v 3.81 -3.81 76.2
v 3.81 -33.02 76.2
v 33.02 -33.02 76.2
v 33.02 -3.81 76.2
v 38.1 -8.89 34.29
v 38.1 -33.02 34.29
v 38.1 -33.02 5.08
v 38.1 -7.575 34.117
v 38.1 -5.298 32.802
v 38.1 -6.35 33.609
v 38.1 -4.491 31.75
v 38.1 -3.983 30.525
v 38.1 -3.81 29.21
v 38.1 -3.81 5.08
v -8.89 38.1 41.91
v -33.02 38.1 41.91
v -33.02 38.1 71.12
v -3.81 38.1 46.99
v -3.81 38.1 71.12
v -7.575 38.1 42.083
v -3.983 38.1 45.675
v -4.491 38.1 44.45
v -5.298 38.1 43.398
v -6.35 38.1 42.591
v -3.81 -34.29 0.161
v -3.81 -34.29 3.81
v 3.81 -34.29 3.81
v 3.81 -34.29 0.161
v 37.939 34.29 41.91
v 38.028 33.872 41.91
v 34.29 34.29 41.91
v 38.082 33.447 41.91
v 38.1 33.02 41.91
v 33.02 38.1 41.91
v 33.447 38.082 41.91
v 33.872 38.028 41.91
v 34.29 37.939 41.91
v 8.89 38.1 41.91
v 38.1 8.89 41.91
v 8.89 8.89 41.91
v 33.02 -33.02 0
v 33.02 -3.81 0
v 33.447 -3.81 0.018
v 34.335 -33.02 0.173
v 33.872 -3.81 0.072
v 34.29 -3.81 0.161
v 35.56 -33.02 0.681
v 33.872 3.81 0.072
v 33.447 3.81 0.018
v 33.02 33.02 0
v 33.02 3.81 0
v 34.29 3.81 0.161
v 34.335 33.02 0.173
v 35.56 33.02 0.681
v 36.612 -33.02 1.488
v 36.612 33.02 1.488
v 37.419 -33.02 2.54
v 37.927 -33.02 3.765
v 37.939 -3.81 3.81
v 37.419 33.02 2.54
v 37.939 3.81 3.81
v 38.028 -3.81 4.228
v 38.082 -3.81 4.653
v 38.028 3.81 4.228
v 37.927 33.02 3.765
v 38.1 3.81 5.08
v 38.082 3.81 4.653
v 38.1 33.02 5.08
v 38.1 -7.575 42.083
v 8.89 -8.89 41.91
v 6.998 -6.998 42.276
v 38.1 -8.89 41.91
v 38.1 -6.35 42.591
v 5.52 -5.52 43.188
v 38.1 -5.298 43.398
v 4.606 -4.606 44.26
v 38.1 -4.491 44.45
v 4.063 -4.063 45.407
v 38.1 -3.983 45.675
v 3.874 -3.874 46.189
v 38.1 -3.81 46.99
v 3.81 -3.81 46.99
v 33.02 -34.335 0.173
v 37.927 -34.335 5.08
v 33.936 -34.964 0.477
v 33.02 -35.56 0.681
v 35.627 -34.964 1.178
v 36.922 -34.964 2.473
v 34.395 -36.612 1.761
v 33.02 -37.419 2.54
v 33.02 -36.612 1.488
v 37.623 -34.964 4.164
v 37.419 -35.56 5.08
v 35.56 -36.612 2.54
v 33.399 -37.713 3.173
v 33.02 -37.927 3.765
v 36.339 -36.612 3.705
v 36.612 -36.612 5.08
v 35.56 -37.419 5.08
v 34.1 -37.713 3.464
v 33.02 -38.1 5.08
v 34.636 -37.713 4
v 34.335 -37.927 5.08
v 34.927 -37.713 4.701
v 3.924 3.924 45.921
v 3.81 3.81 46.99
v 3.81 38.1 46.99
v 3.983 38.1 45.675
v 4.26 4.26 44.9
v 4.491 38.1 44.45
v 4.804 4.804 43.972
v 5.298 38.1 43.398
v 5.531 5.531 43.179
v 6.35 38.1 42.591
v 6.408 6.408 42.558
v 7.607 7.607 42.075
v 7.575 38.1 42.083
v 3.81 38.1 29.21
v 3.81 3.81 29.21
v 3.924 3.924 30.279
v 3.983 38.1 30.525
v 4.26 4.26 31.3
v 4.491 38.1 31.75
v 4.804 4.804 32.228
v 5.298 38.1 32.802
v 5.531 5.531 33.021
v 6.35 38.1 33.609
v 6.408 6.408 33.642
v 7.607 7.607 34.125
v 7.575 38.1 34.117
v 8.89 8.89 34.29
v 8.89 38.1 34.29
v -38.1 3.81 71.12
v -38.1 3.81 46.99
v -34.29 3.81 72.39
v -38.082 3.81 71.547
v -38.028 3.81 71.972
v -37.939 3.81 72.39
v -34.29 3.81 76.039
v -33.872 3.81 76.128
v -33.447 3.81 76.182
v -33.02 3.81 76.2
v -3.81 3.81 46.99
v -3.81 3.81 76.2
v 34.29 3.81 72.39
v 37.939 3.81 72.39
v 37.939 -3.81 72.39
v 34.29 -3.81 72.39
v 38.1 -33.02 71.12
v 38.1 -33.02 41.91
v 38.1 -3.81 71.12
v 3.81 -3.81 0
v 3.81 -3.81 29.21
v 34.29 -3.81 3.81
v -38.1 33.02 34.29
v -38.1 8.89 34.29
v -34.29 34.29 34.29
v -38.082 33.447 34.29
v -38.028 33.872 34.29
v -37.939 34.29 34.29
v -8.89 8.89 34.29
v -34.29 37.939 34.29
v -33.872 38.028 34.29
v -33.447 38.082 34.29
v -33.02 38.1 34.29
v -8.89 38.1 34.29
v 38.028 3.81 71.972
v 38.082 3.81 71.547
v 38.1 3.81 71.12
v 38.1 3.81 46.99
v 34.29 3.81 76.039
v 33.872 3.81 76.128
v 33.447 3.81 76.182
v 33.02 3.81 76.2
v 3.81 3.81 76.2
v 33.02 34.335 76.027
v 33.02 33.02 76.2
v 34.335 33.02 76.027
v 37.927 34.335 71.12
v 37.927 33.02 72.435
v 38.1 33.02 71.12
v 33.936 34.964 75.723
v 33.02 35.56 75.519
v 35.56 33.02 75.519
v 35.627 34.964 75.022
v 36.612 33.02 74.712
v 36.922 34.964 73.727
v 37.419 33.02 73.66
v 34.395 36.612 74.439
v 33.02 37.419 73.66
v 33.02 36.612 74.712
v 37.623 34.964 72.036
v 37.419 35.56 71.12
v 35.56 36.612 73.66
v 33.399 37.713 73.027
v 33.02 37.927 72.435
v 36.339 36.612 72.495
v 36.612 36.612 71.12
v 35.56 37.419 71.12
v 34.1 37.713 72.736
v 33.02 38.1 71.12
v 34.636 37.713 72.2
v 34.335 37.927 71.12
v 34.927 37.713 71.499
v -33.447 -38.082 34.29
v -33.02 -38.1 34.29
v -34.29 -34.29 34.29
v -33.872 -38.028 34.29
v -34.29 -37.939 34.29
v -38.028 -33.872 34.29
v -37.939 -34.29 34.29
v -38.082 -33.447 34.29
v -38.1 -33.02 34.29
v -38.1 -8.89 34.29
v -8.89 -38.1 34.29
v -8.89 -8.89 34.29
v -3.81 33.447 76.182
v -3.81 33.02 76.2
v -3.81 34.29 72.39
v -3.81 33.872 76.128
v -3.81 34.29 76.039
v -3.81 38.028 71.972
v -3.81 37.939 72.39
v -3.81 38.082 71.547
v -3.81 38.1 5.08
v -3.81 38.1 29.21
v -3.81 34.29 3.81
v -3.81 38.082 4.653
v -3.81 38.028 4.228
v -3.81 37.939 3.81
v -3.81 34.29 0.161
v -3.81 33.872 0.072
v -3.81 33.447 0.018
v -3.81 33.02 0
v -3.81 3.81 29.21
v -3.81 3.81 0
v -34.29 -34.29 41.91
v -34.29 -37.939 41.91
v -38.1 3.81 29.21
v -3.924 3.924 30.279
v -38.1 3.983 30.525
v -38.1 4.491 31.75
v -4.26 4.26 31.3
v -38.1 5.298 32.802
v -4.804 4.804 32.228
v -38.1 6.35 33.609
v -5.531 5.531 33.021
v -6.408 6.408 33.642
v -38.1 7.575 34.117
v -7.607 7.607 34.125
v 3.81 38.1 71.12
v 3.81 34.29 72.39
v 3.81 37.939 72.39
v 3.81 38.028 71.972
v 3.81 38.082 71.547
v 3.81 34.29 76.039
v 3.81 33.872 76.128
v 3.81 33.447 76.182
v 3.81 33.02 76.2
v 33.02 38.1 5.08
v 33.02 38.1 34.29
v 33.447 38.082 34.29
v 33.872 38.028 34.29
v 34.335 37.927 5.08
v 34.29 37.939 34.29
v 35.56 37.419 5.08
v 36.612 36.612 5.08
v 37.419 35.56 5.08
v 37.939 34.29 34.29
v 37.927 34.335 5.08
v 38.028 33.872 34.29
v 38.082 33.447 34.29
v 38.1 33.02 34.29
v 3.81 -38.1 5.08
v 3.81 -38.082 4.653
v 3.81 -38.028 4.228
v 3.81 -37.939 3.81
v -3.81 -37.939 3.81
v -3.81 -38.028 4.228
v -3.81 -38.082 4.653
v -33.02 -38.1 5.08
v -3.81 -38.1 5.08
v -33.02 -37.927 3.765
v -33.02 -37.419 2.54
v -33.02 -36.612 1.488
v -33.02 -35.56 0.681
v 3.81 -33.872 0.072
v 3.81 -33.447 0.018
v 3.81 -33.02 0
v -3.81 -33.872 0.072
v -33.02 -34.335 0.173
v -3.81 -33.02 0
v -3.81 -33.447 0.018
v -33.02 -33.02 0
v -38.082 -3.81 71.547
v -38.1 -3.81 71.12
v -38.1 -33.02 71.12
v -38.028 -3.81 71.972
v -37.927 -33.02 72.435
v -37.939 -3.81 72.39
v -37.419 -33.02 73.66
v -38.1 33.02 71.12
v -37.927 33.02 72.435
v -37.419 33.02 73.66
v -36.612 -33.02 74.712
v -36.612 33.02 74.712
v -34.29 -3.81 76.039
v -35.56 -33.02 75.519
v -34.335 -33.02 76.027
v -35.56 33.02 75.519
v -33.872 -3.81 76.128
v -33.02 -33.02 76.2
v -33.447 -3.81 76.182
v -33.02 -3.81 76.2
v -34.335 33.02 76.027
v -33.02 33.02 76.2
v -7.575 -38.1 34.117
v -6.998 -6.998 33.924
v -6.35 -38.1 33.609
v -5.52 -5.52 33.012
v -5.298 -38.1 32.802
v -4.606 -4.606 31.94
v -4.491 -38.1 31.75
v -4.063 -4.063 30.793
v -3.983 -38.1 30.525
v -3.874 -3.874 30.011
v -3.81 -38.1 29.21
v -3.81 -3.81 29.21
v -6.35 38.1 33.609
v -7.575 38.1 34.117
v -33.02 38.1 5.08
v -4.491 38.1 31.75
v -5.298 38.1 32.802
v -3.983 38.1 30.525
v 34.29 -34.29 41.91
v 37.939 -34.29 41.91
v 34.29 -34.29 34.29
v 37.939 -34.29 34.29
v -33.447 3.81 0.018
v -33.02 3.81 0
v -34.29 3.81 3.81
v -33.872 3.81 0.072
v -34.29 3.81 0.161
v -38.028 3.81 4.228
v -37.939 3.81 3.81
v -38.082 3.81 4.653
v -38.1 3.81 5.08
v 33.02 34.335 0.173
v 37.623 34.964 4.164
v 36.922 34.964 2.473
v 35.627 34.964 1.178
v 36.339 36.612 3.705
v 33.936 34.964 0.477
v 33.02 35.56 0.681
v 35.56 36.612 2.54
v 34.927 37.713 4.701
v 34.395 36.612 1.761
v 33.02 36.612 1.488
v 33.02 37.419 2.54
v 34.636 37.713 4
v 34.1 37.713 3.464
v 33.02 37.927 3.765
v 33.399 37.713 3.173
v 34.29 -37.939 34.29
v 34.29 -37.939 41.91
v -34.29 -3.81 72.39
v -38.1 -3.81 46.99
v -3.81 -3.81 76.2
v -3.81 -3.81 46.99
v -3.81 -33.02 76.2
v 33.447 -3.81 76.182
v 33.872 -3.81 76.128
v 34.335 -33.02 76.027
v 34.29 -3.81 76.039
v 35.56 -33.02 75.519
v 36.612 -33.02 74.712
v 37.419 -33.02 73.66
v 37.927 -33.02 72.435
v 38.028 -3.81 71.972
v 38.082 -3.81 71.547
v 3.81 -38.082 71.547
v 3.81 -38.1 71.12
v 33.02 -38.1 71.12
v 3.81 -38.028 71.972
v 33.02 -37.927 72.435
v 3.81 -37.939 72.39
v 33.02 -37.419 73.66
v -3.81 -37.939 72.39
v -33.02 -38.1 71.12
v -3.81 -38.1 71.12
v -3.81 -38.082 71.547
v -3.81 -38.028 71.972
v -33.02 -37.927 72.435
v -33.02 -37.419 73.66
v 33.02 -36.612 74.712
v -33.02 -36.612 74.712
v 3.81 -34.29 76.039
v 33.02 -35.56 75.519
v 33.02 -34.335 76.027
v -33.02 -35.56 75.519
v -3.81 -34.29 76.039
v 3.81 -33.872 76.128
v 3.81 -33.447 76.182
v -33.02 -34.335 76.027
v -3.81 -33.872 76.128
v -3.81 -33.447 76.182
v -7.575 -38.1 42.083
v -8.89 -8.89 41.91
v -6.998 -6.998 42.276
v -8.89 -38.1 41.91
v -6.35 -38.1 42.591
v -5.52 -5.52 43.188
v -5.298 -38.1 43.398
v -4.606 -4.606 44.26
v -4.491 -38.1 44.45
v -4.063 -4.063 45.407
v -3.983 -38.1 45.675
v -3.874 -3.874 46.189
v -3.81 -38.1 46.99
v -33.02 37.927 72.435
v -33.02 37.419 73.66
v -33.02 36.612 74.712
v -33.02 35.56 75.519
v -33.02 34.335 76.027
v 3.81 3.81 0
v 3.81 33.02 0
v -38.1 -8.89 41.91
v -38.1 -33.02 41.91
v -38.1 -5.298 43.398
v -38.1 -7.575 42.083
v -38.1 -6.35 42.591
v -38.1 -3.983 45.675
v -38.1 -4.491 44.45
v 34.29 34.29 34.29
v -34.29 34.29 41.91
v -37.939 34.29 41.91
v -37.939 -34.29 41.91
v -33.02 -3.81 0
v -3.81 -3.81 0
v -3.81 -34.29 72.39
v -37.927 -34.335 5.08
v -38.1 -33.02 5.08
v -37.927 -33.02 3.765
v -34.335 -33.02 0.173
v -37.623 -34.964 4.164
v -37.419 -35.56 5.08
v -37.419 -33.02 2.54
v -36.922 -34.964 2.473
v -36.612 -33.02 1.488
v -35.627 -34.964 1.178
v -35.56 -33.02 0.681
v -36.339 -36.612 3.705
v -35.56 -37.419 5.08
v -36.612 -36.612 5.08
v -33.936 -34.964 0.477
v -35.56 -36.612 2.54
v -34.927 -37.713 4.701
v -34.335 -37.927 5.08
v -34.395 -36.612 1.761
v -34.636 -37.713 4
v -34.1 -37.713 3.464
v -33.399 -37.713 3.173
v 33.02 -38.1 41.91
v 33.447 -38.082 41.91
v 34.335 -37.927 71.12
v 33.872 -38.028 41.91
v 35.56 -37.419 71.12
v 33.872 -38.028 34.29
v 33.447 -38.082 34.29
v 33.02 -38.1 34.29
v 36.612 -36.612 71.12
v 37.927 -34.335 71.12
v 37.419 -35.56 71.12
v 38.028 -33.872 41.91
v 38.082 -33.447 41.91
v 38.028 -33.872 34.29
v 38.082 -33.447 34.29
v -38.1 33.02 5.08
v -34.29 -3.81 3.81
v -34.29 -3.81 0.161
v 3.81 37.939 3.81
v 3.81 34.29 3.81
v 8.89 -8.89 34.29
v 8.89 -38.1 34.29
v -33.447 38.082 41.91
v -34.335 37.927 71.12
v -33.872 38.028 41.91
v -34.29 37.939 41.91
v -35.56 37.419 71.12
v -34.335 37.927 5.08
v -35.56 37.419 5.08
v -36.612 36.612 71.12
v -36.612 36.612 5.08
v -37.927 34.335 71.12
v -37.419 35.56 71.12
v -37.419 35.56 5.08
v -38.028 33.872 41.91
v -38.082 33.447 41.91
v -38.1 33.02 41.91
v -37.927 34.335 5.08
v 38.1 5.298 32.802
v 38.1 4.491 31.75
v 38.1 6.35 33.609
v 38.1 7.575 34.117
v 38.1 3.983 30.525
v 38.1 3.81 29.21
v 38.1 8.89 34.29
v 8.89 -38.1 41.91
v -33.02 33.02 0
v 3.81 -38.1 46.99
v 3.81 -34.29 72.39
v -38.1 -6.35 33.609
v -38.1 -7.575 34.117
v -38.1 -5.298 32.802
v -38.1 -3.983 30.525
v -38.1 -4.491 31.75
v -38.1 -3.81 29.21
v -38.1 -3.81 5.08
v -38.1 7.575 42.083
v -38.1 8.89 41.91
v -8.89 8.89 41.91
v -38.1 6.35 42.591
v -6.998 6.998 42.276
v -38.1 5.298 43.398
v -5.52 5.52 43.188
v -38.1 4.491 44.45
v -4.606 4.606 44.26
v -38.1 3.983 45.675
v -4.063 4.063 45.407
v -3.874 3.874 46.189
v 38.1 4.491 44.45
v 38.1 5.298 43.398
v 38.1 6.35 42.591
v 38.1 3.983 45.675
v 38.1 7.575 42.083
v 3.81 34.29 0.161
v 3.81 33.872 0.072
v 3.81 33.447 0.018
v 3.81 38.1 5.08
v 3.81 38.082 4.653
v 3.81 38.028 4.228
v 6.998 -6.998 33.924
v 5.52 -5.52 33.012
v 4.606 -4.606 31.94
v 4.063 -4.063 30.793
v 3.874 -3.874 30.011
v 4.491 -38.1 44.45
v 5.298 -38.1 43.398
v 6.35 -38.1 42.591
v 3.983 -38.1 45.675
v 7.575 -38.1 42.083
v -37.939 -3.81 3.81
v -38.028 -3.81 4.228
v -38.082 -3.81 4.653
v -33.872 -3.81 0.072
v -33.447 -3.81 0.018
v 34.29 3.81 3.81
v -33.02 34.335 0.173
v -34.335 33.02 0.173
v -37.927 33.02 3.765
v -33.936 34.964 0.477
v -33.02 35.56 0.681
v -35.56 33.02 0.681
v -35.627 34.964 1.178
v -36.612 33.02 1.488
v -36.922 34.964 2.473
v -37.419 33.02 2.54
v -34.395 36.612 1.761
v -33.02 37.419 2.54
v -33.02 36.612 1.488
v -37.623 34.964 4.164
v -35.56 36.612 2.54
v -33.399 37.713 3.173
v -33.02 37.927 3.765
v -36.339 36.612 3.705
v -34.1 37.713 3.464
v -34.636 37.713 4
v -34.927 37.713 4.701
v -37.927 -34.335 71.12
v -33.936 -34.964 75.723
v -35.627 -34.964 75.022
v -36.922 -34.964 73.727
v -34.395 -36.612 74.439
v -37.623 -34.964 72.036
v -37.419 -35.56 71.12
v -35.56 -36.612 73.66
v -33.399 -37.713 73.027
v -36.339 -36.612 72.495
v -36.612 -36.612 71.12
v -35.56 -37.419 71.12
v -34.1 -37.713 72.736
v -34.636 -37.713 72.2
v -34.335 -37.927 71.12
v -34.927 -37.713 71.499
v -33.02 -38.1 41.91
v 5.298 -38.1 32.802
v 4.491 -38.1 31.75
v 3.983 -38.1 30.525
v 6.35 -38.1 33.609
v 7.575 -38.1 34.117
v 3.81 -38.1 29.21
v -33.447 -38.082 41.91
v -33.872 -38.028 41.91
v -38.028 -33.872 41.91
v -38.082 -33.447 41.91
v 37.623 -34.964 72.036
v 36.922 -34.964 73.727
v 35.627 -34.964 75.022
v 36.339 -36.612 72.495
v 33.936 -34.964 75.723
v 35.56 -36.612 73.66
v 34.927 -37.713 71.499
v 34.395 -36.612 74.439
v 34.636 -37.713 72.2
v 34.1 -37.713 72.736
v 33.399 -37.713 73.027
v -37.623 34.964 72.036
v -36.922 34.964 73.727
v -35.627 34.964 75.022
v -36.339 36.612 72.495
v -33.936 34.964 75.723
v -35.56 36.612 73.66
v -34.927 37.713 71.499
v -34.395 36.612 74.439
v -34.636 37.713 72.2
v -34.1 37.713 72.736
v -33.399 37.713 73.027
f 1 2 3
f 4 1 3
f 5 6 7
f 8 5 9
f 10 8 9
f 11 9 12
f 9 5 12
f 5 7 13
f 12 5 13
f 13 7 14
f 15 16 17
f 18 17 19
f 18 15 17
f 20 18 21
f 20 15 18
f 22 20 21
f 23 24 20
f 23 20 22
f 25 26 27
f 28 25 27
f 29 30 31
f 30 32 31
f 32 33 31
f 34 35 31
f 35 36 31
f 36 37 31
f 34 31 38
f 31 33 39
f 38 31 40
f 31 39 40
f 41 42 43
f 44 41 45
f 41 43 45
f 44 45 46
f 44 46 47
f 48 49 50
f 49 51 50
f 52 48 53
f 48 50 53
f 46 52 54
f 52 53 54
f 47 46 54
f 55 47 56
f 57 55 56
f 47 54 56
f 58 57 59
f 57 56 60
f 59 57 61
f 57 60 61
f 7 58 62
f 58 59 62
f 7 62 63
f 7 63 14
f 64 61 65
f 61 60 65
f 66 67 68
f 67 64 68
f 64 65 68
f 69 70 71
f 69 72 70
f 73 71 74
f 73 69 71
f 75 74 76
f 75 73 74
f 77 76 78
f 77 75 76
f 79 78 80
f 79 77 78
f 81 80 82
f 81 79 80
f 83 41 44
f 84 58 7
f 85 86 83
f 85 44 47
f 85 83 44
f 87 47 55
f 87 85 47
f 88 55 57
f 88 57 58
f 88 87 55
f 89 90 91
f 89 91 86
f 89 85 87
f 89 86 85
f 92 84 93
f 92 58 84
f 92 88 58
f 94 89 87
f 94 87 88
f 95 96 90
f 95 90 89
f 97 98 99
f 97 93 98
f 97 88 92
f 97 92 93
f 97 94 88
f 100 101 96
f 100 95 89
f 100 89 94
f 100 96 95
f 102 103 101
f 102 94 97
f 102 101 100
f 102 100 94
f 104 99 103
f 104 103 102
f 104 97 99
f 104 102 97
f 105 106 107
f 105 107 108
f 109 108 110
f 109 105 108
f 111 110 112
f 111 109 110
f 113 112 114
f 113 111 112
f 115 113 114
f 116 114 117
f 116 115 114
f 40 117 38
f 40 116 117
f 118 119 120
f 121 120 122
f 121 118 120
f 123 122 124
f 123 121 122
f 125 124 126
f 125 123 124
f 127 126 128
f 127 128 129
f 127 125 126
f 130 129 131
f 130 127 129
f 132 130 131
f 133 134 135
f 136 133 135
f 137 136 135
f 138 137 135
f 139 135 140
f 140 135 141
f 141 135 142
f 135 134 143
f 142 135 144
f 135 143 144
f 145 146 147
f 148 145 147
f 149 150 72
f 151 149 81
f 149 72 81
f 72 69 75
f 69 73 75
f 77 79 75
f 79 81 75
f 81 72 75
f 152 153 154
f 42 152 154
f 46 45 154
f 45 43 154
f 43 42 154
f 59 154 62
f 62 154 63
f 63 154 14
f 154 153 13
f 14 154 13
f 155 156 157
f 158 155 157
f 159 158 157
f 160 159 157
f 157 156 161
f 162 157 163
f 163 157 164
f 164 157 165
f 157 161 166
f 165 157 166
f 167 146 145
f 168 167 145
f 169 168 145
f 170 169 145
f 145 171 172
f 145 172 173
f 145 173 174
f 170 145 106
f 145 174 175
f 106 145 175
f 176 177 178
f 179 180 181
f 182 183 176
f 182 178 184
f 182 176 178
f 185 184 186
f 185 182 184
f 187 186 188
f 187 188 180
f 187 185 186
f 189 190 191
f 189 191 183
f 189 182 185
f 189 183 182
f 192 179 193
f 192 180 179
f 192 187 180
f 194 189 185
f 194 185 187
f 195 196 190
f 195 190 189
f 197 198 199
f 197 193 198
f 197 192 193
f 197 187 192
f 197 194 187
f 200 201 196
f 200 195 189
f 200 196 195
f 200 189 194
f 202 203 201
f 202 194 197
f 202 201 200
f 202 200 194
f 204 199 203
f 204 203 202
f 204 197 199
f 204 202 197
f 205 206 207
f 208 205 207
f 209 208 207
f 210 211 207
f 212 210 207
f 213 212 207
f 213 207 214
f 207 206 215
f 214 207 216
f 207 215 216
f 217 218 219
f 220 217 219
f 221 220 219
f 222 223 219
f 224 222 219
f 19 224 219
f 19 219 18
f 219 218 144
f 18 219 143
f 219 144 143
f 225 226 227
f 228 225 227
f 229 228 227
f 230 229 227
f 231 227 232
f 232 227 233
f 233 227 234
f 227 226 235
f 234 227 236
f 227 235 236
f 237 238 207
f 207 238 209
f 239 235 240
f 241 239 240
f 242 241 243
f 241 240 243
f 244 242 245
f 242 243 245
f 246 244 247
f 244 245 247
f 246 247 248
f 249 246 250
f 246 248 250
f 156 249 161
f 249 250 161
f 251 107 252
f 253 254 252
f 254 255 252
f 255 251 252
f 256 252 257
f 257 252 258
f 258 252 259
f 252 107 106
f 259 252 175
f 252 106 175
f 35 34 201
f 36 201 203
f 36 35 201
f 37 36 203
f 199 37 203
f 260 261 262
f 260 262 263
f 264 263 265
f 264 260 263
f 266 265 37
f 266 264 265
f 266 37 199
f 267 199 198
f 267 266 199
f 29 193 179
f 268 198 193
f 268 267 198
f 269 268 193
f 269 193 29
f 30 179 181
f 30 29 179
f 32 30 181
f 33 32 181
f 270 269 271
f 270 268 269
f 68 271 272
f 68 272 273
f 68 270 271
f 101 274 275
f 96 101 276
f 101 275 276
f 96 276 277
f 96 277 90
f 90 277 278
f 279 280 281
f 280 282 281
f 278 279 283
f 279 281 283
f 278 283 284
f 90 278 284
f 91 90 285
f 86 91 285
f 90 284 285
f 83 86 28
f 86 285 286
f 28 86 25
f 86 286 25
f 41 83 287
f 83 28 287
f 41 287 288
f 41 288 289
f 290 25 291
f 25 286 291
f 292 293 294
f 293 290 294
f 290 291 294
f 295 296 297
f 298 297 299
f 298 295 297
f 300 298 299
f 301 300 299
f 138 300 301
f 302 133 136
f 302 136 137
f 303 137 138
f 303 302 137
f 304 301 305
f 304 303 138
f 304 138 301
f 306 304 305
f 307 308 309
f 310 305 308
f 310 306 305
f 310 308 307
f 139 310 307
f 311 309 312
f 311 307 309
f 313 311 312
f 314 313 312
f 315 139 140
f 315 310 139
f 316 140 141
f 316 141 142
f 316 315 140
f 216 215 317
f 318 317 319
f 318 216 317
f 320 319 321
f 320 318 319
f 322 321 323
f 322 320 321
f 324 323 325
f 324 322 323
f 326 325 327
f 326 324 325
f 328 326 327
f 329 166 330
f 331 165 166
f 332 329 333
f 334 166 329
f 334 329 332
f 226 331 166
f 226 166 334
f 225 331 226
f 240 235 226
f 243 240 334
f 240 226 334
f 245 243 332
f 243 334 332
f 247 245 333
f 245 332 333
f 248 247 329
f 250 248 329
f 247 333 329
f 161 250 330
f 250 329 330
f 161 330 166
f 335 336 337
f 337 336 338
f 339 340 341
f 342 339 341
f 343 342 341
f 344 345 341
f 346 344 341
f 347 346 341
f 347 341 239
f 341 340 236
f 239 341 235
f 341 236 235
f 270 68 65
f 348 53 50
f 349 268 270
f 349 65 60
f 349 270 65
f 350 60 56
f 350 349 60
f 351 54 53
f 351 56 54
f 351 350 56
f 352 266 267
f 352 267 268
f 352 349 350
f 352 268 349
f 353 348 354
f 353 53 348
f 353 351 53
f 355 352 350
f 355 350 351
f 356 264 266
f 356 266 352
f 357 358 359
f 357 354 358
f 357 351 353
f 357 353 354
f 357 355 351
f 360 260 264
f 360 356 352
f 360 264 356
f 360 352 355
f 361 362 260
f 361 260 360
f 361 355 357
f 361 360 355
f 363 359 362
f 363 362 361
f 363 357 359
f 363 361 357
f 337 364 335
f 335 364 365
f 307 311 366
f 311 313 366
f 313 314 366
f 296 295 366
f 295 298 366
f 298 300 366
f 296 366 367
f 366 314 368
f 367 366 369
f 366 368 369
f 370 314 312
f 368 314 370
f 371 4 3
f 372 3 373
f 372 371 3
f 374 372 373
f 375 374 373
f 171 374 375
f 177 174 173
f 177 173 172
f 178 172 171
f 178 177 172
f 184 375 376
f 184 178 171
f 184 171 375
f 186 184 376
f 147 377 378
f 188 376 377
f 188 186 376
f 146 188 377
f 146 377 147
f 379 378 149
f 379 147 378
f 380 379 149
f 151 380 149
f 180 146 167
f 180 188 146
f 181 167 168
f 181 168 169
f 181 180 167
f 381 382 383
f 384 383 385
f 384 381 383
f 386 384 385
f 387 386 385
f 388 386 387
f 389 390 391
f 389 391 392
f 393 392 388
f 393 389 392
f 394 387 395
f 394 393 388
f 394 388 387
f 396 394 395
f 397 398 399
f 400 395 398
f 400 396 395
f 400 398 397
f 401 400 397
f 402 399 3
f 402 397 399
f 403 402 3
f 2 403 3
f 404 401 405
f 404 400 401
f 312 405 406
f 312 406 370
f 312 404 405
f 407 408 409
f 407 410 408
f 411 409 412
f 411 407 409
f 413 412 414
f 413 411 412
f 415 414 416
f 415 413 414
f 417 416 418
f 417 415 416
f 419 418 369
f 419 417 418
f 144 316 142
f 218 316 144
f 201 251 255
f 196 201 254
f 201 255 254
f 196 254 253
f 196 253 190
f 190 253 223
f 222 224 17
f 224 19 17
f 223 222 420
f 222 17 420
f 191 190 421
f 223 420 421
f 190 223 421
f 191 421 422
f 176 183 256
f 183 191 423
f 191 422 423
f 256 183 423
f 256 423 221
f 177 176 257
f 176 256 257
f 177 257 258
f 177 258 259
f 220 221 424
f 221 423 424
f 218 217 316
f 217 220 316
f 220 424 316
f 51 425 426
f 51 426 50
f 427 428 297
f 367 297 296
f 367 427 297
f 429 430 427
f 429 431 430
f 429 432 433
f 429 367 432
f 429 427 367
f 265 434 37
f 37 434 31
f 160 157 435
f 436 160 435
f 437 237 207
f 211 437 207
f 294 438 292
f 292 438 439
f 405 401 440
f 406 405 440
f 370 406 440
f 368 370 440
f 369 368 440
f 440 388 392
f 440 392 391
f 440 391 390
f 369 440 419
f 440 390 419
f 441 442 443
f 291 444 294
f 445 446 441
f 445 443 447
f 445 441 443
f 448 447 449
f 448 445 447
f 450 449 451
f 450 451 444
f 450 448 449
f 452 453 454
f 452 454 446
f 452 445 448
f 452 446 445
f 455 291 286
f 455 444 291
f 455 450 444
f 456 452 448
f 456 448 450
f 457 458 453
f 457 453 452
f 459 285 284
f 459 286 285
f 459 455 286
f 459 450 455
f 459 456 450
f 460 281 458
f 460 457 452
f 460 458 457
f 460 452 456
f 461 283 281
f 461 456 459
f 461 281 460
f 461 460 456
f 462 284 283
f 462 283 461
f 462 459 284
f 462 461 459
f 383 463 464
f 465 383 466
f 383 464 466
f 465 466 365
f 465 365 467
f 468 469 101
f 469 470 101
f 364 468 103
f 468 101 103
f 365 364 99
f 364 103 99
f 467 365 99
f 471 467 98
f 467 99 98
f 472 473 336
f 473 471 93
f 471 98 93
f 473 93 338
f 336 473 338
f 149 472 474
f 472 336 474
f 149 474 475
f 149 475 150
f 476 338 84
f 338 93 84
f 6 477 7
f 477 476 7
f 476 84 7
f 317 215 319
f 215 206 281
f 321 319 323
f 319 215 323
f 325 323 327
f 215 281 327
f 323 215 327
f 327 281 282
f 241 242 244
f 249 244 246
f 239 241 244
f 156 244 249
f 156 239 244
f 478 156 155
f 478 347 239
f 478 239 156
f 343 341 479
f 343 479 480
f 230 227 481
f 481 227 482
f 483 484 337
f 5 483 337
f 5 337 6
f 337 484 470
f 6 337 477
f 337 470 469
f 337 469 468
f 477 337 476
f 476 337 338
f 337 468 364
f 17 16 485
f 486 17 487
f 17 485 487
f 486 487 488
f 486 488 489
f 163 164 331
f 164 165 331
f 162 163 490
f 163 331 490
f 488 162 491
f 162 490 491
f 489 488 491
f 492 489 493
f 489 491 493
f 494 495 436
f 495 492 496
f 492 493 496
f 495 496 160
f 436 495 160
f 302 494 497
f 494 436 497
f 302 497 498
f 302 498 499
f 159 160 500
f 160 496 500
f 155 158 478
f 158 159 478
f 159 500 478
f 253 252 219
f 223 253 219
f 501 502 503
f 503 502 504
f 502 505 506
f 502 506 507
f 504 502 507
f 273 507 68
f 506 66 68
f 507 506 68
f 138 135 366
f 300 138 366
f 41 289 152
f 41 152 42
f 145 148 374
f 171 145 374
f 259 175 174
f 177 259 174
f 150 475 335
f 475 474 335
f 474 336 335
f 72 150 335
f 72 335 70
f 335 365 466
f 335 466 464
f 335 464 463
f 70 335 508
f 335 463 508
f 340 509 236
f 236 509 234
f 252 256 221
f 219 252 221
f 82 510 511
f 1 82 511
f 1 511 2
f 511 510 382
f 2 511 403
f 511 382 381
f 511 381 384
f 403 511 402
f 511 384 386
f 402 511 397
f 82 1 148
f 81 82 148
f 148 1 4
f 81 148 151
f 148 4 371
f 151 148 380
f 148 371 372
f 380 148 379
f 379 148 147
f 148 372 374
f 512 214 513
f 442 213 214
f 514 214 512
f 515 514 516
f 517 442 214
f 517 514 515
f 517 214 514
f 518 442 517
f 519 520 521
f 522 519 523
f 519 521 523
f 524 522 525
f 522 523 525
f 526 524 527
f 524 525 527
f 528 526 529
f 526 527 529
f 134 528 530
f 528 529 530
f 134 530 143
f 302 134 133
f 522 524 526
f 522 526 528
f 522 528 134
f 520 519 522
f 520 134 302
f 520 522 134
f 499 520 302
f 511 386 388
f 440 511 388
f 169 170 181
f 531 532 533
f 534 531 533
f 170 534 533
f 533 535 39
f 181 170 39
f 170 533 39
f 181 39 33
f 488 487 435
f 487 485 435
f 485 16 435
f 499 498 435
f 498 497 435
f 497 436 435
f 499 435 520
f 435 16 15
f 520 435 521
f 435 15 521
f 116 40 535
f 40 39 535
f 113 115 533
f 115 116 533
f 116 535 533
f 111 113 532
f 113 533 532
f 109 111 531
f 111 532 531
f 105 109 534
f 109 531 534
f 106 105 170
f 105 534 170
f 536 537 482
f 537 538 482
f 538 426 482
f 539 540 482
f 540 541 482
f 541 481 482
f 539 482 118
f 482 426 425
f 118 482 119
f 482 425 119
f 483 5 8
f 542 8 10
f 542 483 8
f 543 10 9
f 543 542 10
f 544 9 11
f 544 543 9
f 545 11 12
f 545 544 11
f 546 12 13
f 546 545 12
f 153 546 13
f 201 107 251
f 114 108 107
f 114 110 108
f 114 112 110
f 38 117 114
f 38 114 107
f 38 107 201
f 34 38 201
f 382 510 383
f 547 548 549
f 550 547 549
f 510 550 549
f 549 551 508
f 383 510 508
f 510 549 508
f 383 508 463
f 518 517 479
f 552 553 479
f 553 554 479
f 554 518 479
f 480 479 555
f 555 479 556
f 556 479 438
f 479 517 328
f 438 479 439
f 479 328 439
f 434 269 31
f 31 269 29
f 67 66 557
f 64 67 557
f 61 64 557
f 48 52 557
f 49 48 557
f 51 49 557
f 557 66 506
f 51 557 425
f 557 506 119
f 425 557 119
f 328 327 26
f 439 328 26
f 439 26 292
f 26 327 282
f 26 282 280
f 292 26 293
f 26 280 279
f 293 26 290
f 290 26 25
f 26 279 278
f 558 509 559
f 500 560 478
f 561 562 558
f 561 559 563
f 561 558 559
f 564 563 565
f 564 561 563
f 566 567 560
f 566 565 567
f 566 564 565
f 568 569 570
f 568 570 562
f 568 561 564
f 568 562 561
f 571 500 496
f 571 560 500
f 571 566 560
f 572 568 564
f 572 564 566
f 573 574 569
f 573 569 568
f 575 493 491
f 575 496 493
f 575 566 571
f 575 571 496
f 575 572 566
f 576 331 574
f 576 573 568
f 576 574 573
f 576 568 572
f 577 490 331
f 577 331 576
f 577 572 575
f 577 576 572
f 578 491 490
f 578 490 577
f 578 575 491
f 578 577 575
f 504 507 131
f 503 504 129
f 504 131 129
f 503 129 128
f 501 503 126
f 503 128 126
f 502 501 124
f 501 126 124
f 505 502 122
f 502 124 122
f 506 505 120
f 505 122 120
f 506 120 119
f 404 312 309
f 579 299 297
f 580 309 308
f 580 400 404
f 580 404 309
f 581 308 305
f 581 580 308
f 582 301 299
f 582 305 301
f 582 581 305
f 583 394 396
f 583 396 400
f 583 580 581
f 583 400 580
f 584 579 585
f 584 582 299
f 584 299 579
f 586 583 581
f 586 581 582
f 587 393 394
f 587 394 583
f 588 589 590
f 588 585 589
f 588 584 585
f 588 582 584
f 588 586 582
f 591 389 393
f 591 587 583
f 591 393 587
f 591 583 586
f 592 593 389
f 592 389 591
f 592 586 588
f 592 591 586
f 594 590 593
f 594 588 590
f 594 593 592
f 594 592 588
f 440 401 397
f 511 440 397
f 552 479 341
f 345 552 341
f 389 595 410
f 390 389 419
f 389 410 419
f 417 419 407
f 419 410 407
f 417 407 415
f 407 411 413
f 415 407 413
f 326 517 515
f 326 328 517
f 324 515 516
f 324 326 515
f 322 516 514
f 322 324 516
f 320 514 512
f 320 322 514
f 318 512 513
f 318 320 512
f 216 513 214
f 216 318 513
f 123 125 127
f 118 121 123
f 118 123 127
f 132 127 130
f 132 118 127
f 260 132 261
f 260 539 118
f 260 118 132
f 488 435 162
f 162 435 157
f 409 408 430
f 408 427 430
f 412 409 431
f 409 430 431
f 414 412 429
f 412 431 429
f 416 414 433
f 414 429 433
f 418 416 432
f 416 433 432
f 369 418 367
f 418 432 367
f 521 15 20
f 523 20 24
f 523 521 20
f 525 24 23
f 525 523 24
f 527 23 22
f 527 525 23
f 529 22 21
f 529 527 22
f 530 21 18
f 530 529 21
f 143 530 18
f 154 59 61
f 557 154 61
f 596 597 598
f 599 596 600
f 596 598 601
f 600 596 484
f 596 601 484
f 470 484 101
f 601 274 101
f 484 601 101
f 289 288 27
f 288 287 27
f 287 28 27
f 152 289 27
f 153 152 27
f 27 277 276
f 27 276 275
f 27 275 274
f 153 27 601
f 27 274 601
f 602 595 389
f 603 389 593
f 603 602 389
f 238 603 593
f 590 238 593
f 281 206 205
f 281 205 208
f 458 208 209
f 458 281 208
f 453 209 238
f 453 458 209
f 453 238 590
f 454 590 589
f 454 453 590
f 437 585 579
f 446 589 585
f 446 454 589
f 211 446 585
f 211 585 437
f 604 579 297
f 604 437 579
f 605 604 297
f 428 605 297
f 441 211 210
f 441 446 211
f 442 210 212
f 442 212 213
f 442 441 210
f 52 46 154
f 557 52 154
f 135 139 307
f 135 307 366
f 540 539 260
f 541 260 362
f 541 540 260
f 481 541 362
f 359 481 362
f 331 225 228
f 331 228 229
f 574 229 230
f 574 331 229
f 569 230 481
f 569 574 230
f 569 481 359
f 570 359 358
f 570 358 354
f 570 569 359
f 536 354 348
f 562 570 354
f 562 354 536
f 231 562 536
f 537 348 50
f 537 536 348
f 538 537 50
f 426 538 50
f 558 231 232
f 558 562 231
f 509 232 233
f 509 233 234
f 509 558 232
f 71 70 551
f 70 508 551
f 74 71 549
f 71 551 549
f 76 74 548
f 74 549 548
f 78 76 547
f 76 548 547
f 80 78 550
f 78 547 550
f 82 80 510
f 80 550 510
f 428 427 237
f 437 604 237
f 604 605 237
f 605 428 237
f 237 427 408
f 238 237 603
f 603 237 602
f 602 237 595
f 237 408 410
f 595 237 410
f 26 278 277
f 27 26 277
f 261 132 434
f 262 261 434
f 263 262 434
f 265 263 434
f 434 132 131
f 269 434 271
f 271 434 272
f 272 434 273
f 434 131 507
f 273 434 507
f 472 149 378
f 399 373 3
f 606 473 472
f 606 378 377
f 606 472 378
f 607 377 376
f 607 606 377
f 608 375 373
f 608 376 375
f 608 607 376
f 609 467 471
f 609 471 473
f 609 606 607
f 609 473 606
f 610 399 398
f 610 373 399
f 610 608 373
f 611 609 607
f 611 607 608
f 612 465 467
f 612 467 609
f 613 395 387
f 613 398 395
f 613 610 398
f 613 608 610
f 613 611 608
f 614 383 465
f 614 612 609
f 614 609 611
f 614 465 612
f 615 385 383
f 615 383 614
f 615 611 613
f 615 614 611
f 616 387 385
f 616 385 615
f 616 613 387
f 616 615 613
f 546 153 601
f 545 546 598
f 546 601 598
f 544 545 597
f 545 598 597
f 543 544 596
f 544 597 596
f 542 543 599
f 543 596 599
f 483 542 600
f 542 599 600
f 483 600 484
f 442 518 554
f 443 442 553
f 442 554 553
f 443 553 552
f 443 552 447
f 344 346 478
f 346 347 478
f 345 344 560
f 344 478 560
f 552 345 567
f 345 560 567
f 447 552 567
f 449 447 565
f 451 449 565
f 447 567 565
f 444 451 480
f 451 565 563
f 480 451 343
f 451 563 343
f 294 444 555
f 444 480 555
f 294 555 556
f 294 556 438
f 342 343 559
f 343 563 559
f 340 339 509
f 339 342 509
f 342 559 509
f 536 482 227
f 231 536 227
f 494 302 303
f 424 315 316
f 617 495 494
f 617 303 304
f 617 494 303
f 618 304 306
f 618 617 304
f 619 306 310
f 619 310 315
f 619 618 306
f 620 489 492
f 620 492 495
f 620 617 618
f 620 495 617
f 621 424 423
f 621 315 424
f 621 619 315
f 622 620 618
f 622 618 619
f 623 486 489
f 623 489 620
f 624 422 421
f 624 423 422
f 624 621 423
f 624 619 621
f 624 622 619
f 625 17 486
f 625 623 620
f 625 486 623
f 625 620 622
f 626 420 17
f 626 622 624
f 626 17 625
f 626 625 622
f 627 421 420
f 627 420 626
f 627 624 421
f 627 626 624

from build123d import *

# Parameters (mm, degrees)
F0_W         = 76.2
F0_H         = 76.2
F1_DEPTH     = 76.2
F3_DEPTH     = 76.2
F5_DEPTH     = 76.2
F7_DEPTH     = 76.2
F8_T1_DEPTH  = 66.04
F8_T3_DEPTH  = 66.04
F8_T5_DEPTH  = 66.04
F8_S9_W      = 5.08
F8_S9_H      = 5.08
F8_T10_DEPTH = 5.08
F8_S15_W     = 5.08
F8_S15_H     = 5.08
F8_T16_DEPTH = 5.08
F8_S21_W     = 5.08
F8_S21_H     = 5.08
F8_T22_DEPTH = 5.08
F8_S27_W     = 5.08
F8_S27_H     = 5.08
F8_T28_DEPTH = 5.08
F8_S33_W     = 5.08
F8_S33_H     = 5.08
F8_T34_DEPTH = 5.08
F8_S39_W     = 5.08
F8_S39_H     = 5.08
F8_T40_DEPTH = 5.08
F8_S45_W     = 5.08
F8_S45_H     = 5.08
F8_T46_DEPTH = 5.08
F8_S51_W     = 5.08
F8_S51_H     = 5.08
F8_T52_DEPTH = 5.08
F9_R         = 5.08


# Not quite as in the source:
# - a fillet or chamfer that OpenCascade refuses, or shapes differently, is made with other operations: its cross-section is extruded or revolved along the edge and cut away or added


with BuildPart() as f1:
    # F0 (on Top) → F1 (new body)
    with BuildSketch(Plane.XY):
        Rectangle(F0_W, F0_H)
    extrude(amount=F1_DEPTH)

    # F2 (on face) → F3 (cut)
    with BuildSketch(Plane.XZ.offset(38.1)):
        Polygon((-3.81, 41.91), (-34.29, 41.91), (-34.29, 34.29), (-3.81, 34.29), (-3.81, 3.81), (3.81, 3.81), (3.81, 34.29), (34.29, 34.29), (34.29, 41.91), (3.81, 41.91), (3.81, 72.39), (-3.81, 72.39), align=None)
    extrude(amount=-F3_DEPTH, mode=Mode.SUBTRACT)

    # F4 (on face) → F5 (cut)
    with BuildSketch(Plane.XY.offset(76.2)):
        Polygon((3.81, 34.29), (-3.81, 34.29), (-3.81, 3.81), (-34.29, 3.81), (-34.29, -3.81), (-3.81, -3.81), (-3.81, -34.29), (3.81, -34.29), (3.81, -3.81), (34.29, -3.81), (34.29, 3.81), (3.81, 3.81), align=None)
    extrude(amount=-F5_DEPTH, mode=Mode.SUBTRACT)

    # F6 (on face) → F7 (cut)
    with BuildSketch(Plane.YZ.offset(38.1)):
        Polygon((-3.81, 41.91), (-34.29, 41.91), (-34.29, 34.29), (-3.81, 34.29), (-3.81, 3.81), (3.81, 3.81), (3.81, 34.29), (34.29, 34.29), (34.29, 41.91), (3.81, 41.91), (3.81, 72.39), (-3.81, 72.39), align=None)
    extrude(amount=-F7_DEPTH, mode=Mode.SUBTRACT)

    # F8: fillet of radius 5.08 on 12 edges, made by hand

    # F8_s2 → F8_t1 (cut)
    with BuildSketch(Plane.XY.offset(5.08)):
        with BuildLine():
            ThreePointArc((33.02, -38.1), (36.6121024484, -36.6121024484), (38.1, -33.02))
            Line((38.1, -33.02), (38.1, -38.1))
            Line((38.1, -38.1), (33.02, -38.1))
        make_face()
        with BuildLine():
            ThreePointArc((-33.02, -38.1), (-36.6121024484, -36.6121024484), (-38.1, -33.02))
            Line((-38.1, -33.02), (-38.1, -38.1))
            Line((-38.1, -38.1), (-33.02, -38.1))
        make_face()
        with BuildLine():
            ThreePointArc((33.02, 38.1), (36.6121024484, 36.6121024484), (38.1, 33.02))
            Line((38.1, 33.02), (38.1, 38.1))
            Line((38.1, 38.1), (33.02, 38.1))
        make_face()
        with BuildLine():
            ThreePointArc((-33.02, 38.1), (-36.6121024484, 36.6121024484), (-38.1, 33.02))
            Line((-38.1, 33.02), (-38.1, 38.1))
            Line((-38.1, 38.1), (-33.02, 38.1))
        make_face()
    extrude(amount=F8_T1_DEPTH, mode=Mode.SUBTRACT)

    # F8_s4 → F8_t3 (cut)
    with BuildSketch(Plane.YZ.offset(-33.02)):
        with BuildLine():
            ThreePointArc((-38.1, 71.12), (-36.6121024484, 74.7121024484), (-33.02, 76.2))
            Line((-33.02, 76.2), (-38.1, 76.2))
            Line((-38.1, 76.2), (-38.1, 71.12))
        make_face()
        with BuildLine():
            ThreePointArc((-38.1, 5.08), (-36.6121024484, 1.4878975516), (-33.02, 0))
            Line((-33.02, 0), (-38.1, 0))
            Line((-38.1, 0), (-38.1, 5.08))
        make_face()
        with BuildLine():
            ThreePointArc((38.1, 71.12), (36.6121024484, 74.7121024484), (33.02, 76.2))
            Line((33.02, 76.2), (38.1, 76.2))
            Line((38.1, 76.2), (38.1, 71.12))
        make_face()
        with BuildLine():
            ThreePointArc((38.1, 5.08), (36.6121024484, 1.4878975516), (33.02, 0))
            Line((33.02, 0), (38.1, 0))
            Line((38.1, 0), (38.1, 5.08))
        make_face()
    extrude(amount=F8_T3_DEPTH, mode=Mode.SUBTRACT)

    # F8_s6 → F8_t5 (cut)
    with BuildSketch(Plane.XZ.offset(-33.02)):
        with BuildLine():
            ThreePointArc((33.02, 76.2), (36.6121024484, 74.7121024484), (38.1, 71.12))
            Line((38.1, 71.12), (38.1, 76.2))
            Line((38.1, 76.2), (33.02, 76.2))
        make_face()
        with BuildLine():
            ThreePointArc((33.02, 0), (36.6121024484, 1.4878975516), (38.1, 5.08))
            Line((38.1, 5.08), (38.1, 0))
            Line((38.1, 0), (33.02, 0))
        make_face()
        with BuildLine():
            ThreePointArc((-38.1, 71.12), (-36.6121024484, 74.7121024484), (-33.02, 76.2))
            Line((-33.02, 76.2), (-38.1, 76.2))
            Line((-38.1, 76.2), (-38.1, 71.12))
        make_face()
        with BuildLine():
            ThreePointArc((-38.1, 5.08), (-36.6121024484, 1.4878975516), (-33.02, 0))
            Line((-33.02, 0), (-38.1, 0))
            Line((-38.1, 0), (-38.1, 5.08))
        make_face()
    extrude(amount=F8_T5_DEPTH, mode=Mode.SUBTRACT)


with BuildPart() as f8_tool8:
    # F8_s9 → F8_t10 (new body)
    with BuildSketch(Plane.XZ.offset(33.02)):
        with Locations((35.56, 2.54)):
            Rectangle(F8_S9_W, F8_S9_H)
    extrude(amount=F8_T10_DEPTH)

    # F8_s11 → F8_t12 (revolve, cut)
    with BuildSketch(Plane(origin=(33.02, -33.02, 5.08), x_dir=(-0.7071067812, 0, 0.7071067812), z_dir=(0.7071067812, 0, 0.7071067812))):
        with BuildLine():
            ThreePointArc((0, -5.08), (5.08, 0), (0, 5.08))
            Line((0, 5.08), (0, -5.08))
        make_face()
    revolve(axis=Axis((33.02, -33.02, 5.08), (0, -1, 0)), mode=Mode.SUBTRACT)


with BuildPart() as f1_1:
    add(f1.part)

    # F8_t7: cut F8_tool8
    add(f8_tool8.part, mode=Mode.SUBTRACT)


with BuildPart() as f8_tool14:
    # F8_s15 → F8_t16 (new body)
    with BuildSketch(Plane.XZ.offset(33.02)):
        with Locations((35.56, 73.66)):
            Rectangle(F8_S15_W, F8_S15_H)
    extrude(amount=F8_T16_DEPTH)

    # F8_s17 → F8_t18 (revolve, cut)
    with BuildSketch(Plane(origin=(33.02, -33.02, 71.12), x_dir=(-0.7071067812, 0, -0.7071067812), z_dir=(-0.7071067812, 0, 0.7071067812))):
        with BuildLine():
            ThreePointArc((0, -5.08), (5.08, 0), (0, 5.08))
            Line((0, 5.08), (0, -5.08))
        make_face()
    revolve(axis=Axis((33.02, -33.02, 71.12), (0, -1, 0)), mode=Mode.SUBTRACT)


with BuildPart() as f1_2:
    add(f1_1.part)

    # F8_t13: cut F8_tool14
    add(f8_tool14.part, mode=Mode.SUBTRACT)


with BuildPart() as f8_tool20:
    # F8_s21 → F8_t22 (new body)
    with BuildSketch(Plane.XZ.offset(33.02)):
        with Locations((-35.56, 73.66)):
            Rectangle(F8_S21_W, F8_S21_H)
    extrude(amount=F8_T22_DEPTH)

    # F8_s23 → F8_t24 (revolve, cut)
    with BuildSketch(Plane(origin=(-33.02, -33.02, 71.12), x_dir=(0.7071067812, 0, -0.7071067812), z_dir=(-0.7071067812, 0, -0.7071067812))):
        with BuildLine():
            ThreePointArc((0, -5.08), (5.08, 0), (0, 5.08))
            Line((0, 5.08), (0, -5.08))
        make_face()
    revolve(axis=Axis((-33.02, -33.02, 71.12), (0, -1, 0)), mode=Mode.SUBTRACT)


with BuildPart() as f1_3:
    add(f1_2.part)

    # F8_t19: cut F8_tool20
    add(f8_tool20.part, mode=Mode.SUBTRACT)


with BuildPart() as f8_tool26:
    # F8_s27 → F8_t28 (new body)
    with BuildSketch(Plane.XZ.offset(-33.02)):
        with Locations((35.56, 73.66)):
            Rectangle(F8_S27_W, F8_S27_H)
    extrude(amount=-F8_T28_DEPTH)

    # F8_s29 → F8_t30 (revolve, cut)
    with BuildSketch(Plane(origin=(33.02, 33.02, 71.12), x_dir=(-0.7071067812, 0, -0.7071067812), z_dir=(0.7071067812, 0, -0.7071067812))):
        with BuildLine():
            ThreePointArc((0, -5.08), (5.08, 0), (0, 5.08))
            Line((0, 5.08), (0, -5.08))
        make_face()
    revolve(axis=Axis((33.02, 33.02, 71.12), (0, 1, 0)), mode=Mode.SUBTRACT)


with BuildPart() as f1_4:
    add(f1_3.part)

    # F8_t25: cut F8_tool26
    add(f8_tool26.part, mode=Mode.SUBTRACT)


with BuildPart() as f8_tool32:
    # F8_s33 → F8_t34 (new body)
    with BuildSketch(Plane.XZ.offset(33.02)):
        with Locations((-35.56, 2.54)):
            Rectangle(F8_S33_W, F8_S33_H)
    extrude(amount=F8_T34_DEPTH)

    # F8_s35 → F8_t36 (revolve, cut)
    with BuildSketch(Plane(origin=(-33.02, -33.02, 5.08), x_dir=(0.7071067812, 0, 0.7071067812), z_dir=(0.7071067812, 0, -0.7071067812))):
        with BuildLine():
            ThreePointArc((0, -5.08), (5.08, 0), (0, 5.08))
            Line((0, 5.08), (0, -5.08))
        make_face()
    revolve(axis=Axis((-33.02, -33.02, 5.08), (0, -1, 0)), mode=Mode.SUBTRACT)


with BuildPart() as f1_5:
    add(f1_4.part)

    # F8_t31: cut F8_tool32
    add(f8_tool32.part, mode=Mode.SUBTRACT)


with BuildPart() as f8_tool38:
    # F8_s39 → F8_t40 (new body)
    with BuildSketch(Plane.XZ.offset(-33.02)):
        with Locations((35.56, 2.54)):
            Rectangle(F8_S39_W, F8_S39_H)
    extrude(amount=-F8_T40_DEPTH)

    # F8_s41 → F8_t42 (revolve, cut)
    with BuildSketch(Plane(origin=(33.02, 33.02, 5.08), x_dir=(-0.7071067812, 0, 0.7071067812), z_dir=(-0.7071067812, 0, -0.7071067812))):
        with BuildLine():
            ThreePointArc((0, -5.08), (5.08, 0), (0, 5.08))
            Line((0, 5.08), (0, -5.08))
        make_face()
    revolve(axis=Axis((33.02, 33.02, 5.08), (0, 1, 0)), mode=Mode.SUBTRACT)


with BuildPart() as f1_6:
    add(f1_5.part)

    # F8_t37: cut F8_tool38
    add(f8_tool38.part, mode=Mode.SUBTRACT)


with BuildPart() as f8_tool44:
    # F8_s45 → F8_t46 (new body)
    with BuildSketch(Plane.XZ.offset(-33.02)):
        with Locations((-35.56, 73.66)):
            Rectangle(F8_S45_W, F8_S45_H)
    extrude(amount=-F8_T46_DEPTH)

    # F8_s47 → F8_t48 (revolve, cut)
    with BuildSketch(Plane(origin=(-33.02, 33.02, 71.12), x_dir=(0.7071067812, 0, -0.7071067812), z_dir=(0.7071067812, 0, 0.7071067812))):
        with BuildLine():
            ThreePointArc((0, -5.08), (5.08, 0), (0, 5.08))
            Line((0, 5.08), (0, -5.08))
        make_face()
    revolve(axis=Axis((-33.02, 33.02, 71.12), (0, 1, 0)), mode=Mode.SUBTRACT)


with BuildPart() as f1_7:
    add(f1_6.part)

    # F8_t43: cut F8_tool44
    add(f8_tool44.part, mode=Mode.SUBTRACT)


with BuildPart() as f8_tool50:
    # F8_s51 → F8_t52 (new body)
    with BuildSketch(Plane.XZ.offset(-33.02)):
        with Locations((-35.56, 2.54)):
            Rectangle(F8_S51_W, F8_S51_H)
    extrude(amount=-F8_T52_DEPTH)

    # F8_s53 → F8_t54 (revolve, cut)
    with BuildSketch(Plane(origin=(-33.02, 33.02, 5.08), x_dir=(0.7071067812, 0, 0.7071067812), z_dir=(-0.7071067812, 0, 0.7071067812))):
        with BuildLine():
            ThreePointArc((0, -5.08), (5.08, 0), (0, 5.08))
            Line((0, 5.08), (0, -5.08))
        make_face()
    revolve(axis=Axis((-33.02, 33.02, 5.08), (0, 1, 0)), mode=Mode.SUBTRACT)


with BuildPart() as f1_8:
    add(f1_7.part)

    # F8_t49: cut F8_tool50
    add(f8_tool50.part, mode=Mode.SUBTRACT)

    # F9
    f9_edges = [f1_8.edges().sort_by_distance(p)[0] for p in [
        (3.81, 20.955, 34.29),
        (3.81, 20.955, 41.91),
        (-3.81, 20.955, 34.29),
        (-3.81, 20.955, 41.91),
        (20.955, 3.81, 34.29),
        (20.955, -3.81, 34.29),
        (20.955, -3.81, 41.91),
        (20.955, 3.81, 41.91),
        (-3.81, -20.955, 34.29),
        (-3.81, -20.955, 41.91),
        (3.81, -20.955, 34.29),
        (3.81, -20.955, 41.91),
        (-20.955, 3.81, 41.91),
        (-20.955, 3.81, 34.29),
        (-20.955, -3.81, 34.29),
        (-20.955, -3.81, 41.91),
    ]]
    fillet(f9_edges, radius=F9_R)


solid = f1_8.part
